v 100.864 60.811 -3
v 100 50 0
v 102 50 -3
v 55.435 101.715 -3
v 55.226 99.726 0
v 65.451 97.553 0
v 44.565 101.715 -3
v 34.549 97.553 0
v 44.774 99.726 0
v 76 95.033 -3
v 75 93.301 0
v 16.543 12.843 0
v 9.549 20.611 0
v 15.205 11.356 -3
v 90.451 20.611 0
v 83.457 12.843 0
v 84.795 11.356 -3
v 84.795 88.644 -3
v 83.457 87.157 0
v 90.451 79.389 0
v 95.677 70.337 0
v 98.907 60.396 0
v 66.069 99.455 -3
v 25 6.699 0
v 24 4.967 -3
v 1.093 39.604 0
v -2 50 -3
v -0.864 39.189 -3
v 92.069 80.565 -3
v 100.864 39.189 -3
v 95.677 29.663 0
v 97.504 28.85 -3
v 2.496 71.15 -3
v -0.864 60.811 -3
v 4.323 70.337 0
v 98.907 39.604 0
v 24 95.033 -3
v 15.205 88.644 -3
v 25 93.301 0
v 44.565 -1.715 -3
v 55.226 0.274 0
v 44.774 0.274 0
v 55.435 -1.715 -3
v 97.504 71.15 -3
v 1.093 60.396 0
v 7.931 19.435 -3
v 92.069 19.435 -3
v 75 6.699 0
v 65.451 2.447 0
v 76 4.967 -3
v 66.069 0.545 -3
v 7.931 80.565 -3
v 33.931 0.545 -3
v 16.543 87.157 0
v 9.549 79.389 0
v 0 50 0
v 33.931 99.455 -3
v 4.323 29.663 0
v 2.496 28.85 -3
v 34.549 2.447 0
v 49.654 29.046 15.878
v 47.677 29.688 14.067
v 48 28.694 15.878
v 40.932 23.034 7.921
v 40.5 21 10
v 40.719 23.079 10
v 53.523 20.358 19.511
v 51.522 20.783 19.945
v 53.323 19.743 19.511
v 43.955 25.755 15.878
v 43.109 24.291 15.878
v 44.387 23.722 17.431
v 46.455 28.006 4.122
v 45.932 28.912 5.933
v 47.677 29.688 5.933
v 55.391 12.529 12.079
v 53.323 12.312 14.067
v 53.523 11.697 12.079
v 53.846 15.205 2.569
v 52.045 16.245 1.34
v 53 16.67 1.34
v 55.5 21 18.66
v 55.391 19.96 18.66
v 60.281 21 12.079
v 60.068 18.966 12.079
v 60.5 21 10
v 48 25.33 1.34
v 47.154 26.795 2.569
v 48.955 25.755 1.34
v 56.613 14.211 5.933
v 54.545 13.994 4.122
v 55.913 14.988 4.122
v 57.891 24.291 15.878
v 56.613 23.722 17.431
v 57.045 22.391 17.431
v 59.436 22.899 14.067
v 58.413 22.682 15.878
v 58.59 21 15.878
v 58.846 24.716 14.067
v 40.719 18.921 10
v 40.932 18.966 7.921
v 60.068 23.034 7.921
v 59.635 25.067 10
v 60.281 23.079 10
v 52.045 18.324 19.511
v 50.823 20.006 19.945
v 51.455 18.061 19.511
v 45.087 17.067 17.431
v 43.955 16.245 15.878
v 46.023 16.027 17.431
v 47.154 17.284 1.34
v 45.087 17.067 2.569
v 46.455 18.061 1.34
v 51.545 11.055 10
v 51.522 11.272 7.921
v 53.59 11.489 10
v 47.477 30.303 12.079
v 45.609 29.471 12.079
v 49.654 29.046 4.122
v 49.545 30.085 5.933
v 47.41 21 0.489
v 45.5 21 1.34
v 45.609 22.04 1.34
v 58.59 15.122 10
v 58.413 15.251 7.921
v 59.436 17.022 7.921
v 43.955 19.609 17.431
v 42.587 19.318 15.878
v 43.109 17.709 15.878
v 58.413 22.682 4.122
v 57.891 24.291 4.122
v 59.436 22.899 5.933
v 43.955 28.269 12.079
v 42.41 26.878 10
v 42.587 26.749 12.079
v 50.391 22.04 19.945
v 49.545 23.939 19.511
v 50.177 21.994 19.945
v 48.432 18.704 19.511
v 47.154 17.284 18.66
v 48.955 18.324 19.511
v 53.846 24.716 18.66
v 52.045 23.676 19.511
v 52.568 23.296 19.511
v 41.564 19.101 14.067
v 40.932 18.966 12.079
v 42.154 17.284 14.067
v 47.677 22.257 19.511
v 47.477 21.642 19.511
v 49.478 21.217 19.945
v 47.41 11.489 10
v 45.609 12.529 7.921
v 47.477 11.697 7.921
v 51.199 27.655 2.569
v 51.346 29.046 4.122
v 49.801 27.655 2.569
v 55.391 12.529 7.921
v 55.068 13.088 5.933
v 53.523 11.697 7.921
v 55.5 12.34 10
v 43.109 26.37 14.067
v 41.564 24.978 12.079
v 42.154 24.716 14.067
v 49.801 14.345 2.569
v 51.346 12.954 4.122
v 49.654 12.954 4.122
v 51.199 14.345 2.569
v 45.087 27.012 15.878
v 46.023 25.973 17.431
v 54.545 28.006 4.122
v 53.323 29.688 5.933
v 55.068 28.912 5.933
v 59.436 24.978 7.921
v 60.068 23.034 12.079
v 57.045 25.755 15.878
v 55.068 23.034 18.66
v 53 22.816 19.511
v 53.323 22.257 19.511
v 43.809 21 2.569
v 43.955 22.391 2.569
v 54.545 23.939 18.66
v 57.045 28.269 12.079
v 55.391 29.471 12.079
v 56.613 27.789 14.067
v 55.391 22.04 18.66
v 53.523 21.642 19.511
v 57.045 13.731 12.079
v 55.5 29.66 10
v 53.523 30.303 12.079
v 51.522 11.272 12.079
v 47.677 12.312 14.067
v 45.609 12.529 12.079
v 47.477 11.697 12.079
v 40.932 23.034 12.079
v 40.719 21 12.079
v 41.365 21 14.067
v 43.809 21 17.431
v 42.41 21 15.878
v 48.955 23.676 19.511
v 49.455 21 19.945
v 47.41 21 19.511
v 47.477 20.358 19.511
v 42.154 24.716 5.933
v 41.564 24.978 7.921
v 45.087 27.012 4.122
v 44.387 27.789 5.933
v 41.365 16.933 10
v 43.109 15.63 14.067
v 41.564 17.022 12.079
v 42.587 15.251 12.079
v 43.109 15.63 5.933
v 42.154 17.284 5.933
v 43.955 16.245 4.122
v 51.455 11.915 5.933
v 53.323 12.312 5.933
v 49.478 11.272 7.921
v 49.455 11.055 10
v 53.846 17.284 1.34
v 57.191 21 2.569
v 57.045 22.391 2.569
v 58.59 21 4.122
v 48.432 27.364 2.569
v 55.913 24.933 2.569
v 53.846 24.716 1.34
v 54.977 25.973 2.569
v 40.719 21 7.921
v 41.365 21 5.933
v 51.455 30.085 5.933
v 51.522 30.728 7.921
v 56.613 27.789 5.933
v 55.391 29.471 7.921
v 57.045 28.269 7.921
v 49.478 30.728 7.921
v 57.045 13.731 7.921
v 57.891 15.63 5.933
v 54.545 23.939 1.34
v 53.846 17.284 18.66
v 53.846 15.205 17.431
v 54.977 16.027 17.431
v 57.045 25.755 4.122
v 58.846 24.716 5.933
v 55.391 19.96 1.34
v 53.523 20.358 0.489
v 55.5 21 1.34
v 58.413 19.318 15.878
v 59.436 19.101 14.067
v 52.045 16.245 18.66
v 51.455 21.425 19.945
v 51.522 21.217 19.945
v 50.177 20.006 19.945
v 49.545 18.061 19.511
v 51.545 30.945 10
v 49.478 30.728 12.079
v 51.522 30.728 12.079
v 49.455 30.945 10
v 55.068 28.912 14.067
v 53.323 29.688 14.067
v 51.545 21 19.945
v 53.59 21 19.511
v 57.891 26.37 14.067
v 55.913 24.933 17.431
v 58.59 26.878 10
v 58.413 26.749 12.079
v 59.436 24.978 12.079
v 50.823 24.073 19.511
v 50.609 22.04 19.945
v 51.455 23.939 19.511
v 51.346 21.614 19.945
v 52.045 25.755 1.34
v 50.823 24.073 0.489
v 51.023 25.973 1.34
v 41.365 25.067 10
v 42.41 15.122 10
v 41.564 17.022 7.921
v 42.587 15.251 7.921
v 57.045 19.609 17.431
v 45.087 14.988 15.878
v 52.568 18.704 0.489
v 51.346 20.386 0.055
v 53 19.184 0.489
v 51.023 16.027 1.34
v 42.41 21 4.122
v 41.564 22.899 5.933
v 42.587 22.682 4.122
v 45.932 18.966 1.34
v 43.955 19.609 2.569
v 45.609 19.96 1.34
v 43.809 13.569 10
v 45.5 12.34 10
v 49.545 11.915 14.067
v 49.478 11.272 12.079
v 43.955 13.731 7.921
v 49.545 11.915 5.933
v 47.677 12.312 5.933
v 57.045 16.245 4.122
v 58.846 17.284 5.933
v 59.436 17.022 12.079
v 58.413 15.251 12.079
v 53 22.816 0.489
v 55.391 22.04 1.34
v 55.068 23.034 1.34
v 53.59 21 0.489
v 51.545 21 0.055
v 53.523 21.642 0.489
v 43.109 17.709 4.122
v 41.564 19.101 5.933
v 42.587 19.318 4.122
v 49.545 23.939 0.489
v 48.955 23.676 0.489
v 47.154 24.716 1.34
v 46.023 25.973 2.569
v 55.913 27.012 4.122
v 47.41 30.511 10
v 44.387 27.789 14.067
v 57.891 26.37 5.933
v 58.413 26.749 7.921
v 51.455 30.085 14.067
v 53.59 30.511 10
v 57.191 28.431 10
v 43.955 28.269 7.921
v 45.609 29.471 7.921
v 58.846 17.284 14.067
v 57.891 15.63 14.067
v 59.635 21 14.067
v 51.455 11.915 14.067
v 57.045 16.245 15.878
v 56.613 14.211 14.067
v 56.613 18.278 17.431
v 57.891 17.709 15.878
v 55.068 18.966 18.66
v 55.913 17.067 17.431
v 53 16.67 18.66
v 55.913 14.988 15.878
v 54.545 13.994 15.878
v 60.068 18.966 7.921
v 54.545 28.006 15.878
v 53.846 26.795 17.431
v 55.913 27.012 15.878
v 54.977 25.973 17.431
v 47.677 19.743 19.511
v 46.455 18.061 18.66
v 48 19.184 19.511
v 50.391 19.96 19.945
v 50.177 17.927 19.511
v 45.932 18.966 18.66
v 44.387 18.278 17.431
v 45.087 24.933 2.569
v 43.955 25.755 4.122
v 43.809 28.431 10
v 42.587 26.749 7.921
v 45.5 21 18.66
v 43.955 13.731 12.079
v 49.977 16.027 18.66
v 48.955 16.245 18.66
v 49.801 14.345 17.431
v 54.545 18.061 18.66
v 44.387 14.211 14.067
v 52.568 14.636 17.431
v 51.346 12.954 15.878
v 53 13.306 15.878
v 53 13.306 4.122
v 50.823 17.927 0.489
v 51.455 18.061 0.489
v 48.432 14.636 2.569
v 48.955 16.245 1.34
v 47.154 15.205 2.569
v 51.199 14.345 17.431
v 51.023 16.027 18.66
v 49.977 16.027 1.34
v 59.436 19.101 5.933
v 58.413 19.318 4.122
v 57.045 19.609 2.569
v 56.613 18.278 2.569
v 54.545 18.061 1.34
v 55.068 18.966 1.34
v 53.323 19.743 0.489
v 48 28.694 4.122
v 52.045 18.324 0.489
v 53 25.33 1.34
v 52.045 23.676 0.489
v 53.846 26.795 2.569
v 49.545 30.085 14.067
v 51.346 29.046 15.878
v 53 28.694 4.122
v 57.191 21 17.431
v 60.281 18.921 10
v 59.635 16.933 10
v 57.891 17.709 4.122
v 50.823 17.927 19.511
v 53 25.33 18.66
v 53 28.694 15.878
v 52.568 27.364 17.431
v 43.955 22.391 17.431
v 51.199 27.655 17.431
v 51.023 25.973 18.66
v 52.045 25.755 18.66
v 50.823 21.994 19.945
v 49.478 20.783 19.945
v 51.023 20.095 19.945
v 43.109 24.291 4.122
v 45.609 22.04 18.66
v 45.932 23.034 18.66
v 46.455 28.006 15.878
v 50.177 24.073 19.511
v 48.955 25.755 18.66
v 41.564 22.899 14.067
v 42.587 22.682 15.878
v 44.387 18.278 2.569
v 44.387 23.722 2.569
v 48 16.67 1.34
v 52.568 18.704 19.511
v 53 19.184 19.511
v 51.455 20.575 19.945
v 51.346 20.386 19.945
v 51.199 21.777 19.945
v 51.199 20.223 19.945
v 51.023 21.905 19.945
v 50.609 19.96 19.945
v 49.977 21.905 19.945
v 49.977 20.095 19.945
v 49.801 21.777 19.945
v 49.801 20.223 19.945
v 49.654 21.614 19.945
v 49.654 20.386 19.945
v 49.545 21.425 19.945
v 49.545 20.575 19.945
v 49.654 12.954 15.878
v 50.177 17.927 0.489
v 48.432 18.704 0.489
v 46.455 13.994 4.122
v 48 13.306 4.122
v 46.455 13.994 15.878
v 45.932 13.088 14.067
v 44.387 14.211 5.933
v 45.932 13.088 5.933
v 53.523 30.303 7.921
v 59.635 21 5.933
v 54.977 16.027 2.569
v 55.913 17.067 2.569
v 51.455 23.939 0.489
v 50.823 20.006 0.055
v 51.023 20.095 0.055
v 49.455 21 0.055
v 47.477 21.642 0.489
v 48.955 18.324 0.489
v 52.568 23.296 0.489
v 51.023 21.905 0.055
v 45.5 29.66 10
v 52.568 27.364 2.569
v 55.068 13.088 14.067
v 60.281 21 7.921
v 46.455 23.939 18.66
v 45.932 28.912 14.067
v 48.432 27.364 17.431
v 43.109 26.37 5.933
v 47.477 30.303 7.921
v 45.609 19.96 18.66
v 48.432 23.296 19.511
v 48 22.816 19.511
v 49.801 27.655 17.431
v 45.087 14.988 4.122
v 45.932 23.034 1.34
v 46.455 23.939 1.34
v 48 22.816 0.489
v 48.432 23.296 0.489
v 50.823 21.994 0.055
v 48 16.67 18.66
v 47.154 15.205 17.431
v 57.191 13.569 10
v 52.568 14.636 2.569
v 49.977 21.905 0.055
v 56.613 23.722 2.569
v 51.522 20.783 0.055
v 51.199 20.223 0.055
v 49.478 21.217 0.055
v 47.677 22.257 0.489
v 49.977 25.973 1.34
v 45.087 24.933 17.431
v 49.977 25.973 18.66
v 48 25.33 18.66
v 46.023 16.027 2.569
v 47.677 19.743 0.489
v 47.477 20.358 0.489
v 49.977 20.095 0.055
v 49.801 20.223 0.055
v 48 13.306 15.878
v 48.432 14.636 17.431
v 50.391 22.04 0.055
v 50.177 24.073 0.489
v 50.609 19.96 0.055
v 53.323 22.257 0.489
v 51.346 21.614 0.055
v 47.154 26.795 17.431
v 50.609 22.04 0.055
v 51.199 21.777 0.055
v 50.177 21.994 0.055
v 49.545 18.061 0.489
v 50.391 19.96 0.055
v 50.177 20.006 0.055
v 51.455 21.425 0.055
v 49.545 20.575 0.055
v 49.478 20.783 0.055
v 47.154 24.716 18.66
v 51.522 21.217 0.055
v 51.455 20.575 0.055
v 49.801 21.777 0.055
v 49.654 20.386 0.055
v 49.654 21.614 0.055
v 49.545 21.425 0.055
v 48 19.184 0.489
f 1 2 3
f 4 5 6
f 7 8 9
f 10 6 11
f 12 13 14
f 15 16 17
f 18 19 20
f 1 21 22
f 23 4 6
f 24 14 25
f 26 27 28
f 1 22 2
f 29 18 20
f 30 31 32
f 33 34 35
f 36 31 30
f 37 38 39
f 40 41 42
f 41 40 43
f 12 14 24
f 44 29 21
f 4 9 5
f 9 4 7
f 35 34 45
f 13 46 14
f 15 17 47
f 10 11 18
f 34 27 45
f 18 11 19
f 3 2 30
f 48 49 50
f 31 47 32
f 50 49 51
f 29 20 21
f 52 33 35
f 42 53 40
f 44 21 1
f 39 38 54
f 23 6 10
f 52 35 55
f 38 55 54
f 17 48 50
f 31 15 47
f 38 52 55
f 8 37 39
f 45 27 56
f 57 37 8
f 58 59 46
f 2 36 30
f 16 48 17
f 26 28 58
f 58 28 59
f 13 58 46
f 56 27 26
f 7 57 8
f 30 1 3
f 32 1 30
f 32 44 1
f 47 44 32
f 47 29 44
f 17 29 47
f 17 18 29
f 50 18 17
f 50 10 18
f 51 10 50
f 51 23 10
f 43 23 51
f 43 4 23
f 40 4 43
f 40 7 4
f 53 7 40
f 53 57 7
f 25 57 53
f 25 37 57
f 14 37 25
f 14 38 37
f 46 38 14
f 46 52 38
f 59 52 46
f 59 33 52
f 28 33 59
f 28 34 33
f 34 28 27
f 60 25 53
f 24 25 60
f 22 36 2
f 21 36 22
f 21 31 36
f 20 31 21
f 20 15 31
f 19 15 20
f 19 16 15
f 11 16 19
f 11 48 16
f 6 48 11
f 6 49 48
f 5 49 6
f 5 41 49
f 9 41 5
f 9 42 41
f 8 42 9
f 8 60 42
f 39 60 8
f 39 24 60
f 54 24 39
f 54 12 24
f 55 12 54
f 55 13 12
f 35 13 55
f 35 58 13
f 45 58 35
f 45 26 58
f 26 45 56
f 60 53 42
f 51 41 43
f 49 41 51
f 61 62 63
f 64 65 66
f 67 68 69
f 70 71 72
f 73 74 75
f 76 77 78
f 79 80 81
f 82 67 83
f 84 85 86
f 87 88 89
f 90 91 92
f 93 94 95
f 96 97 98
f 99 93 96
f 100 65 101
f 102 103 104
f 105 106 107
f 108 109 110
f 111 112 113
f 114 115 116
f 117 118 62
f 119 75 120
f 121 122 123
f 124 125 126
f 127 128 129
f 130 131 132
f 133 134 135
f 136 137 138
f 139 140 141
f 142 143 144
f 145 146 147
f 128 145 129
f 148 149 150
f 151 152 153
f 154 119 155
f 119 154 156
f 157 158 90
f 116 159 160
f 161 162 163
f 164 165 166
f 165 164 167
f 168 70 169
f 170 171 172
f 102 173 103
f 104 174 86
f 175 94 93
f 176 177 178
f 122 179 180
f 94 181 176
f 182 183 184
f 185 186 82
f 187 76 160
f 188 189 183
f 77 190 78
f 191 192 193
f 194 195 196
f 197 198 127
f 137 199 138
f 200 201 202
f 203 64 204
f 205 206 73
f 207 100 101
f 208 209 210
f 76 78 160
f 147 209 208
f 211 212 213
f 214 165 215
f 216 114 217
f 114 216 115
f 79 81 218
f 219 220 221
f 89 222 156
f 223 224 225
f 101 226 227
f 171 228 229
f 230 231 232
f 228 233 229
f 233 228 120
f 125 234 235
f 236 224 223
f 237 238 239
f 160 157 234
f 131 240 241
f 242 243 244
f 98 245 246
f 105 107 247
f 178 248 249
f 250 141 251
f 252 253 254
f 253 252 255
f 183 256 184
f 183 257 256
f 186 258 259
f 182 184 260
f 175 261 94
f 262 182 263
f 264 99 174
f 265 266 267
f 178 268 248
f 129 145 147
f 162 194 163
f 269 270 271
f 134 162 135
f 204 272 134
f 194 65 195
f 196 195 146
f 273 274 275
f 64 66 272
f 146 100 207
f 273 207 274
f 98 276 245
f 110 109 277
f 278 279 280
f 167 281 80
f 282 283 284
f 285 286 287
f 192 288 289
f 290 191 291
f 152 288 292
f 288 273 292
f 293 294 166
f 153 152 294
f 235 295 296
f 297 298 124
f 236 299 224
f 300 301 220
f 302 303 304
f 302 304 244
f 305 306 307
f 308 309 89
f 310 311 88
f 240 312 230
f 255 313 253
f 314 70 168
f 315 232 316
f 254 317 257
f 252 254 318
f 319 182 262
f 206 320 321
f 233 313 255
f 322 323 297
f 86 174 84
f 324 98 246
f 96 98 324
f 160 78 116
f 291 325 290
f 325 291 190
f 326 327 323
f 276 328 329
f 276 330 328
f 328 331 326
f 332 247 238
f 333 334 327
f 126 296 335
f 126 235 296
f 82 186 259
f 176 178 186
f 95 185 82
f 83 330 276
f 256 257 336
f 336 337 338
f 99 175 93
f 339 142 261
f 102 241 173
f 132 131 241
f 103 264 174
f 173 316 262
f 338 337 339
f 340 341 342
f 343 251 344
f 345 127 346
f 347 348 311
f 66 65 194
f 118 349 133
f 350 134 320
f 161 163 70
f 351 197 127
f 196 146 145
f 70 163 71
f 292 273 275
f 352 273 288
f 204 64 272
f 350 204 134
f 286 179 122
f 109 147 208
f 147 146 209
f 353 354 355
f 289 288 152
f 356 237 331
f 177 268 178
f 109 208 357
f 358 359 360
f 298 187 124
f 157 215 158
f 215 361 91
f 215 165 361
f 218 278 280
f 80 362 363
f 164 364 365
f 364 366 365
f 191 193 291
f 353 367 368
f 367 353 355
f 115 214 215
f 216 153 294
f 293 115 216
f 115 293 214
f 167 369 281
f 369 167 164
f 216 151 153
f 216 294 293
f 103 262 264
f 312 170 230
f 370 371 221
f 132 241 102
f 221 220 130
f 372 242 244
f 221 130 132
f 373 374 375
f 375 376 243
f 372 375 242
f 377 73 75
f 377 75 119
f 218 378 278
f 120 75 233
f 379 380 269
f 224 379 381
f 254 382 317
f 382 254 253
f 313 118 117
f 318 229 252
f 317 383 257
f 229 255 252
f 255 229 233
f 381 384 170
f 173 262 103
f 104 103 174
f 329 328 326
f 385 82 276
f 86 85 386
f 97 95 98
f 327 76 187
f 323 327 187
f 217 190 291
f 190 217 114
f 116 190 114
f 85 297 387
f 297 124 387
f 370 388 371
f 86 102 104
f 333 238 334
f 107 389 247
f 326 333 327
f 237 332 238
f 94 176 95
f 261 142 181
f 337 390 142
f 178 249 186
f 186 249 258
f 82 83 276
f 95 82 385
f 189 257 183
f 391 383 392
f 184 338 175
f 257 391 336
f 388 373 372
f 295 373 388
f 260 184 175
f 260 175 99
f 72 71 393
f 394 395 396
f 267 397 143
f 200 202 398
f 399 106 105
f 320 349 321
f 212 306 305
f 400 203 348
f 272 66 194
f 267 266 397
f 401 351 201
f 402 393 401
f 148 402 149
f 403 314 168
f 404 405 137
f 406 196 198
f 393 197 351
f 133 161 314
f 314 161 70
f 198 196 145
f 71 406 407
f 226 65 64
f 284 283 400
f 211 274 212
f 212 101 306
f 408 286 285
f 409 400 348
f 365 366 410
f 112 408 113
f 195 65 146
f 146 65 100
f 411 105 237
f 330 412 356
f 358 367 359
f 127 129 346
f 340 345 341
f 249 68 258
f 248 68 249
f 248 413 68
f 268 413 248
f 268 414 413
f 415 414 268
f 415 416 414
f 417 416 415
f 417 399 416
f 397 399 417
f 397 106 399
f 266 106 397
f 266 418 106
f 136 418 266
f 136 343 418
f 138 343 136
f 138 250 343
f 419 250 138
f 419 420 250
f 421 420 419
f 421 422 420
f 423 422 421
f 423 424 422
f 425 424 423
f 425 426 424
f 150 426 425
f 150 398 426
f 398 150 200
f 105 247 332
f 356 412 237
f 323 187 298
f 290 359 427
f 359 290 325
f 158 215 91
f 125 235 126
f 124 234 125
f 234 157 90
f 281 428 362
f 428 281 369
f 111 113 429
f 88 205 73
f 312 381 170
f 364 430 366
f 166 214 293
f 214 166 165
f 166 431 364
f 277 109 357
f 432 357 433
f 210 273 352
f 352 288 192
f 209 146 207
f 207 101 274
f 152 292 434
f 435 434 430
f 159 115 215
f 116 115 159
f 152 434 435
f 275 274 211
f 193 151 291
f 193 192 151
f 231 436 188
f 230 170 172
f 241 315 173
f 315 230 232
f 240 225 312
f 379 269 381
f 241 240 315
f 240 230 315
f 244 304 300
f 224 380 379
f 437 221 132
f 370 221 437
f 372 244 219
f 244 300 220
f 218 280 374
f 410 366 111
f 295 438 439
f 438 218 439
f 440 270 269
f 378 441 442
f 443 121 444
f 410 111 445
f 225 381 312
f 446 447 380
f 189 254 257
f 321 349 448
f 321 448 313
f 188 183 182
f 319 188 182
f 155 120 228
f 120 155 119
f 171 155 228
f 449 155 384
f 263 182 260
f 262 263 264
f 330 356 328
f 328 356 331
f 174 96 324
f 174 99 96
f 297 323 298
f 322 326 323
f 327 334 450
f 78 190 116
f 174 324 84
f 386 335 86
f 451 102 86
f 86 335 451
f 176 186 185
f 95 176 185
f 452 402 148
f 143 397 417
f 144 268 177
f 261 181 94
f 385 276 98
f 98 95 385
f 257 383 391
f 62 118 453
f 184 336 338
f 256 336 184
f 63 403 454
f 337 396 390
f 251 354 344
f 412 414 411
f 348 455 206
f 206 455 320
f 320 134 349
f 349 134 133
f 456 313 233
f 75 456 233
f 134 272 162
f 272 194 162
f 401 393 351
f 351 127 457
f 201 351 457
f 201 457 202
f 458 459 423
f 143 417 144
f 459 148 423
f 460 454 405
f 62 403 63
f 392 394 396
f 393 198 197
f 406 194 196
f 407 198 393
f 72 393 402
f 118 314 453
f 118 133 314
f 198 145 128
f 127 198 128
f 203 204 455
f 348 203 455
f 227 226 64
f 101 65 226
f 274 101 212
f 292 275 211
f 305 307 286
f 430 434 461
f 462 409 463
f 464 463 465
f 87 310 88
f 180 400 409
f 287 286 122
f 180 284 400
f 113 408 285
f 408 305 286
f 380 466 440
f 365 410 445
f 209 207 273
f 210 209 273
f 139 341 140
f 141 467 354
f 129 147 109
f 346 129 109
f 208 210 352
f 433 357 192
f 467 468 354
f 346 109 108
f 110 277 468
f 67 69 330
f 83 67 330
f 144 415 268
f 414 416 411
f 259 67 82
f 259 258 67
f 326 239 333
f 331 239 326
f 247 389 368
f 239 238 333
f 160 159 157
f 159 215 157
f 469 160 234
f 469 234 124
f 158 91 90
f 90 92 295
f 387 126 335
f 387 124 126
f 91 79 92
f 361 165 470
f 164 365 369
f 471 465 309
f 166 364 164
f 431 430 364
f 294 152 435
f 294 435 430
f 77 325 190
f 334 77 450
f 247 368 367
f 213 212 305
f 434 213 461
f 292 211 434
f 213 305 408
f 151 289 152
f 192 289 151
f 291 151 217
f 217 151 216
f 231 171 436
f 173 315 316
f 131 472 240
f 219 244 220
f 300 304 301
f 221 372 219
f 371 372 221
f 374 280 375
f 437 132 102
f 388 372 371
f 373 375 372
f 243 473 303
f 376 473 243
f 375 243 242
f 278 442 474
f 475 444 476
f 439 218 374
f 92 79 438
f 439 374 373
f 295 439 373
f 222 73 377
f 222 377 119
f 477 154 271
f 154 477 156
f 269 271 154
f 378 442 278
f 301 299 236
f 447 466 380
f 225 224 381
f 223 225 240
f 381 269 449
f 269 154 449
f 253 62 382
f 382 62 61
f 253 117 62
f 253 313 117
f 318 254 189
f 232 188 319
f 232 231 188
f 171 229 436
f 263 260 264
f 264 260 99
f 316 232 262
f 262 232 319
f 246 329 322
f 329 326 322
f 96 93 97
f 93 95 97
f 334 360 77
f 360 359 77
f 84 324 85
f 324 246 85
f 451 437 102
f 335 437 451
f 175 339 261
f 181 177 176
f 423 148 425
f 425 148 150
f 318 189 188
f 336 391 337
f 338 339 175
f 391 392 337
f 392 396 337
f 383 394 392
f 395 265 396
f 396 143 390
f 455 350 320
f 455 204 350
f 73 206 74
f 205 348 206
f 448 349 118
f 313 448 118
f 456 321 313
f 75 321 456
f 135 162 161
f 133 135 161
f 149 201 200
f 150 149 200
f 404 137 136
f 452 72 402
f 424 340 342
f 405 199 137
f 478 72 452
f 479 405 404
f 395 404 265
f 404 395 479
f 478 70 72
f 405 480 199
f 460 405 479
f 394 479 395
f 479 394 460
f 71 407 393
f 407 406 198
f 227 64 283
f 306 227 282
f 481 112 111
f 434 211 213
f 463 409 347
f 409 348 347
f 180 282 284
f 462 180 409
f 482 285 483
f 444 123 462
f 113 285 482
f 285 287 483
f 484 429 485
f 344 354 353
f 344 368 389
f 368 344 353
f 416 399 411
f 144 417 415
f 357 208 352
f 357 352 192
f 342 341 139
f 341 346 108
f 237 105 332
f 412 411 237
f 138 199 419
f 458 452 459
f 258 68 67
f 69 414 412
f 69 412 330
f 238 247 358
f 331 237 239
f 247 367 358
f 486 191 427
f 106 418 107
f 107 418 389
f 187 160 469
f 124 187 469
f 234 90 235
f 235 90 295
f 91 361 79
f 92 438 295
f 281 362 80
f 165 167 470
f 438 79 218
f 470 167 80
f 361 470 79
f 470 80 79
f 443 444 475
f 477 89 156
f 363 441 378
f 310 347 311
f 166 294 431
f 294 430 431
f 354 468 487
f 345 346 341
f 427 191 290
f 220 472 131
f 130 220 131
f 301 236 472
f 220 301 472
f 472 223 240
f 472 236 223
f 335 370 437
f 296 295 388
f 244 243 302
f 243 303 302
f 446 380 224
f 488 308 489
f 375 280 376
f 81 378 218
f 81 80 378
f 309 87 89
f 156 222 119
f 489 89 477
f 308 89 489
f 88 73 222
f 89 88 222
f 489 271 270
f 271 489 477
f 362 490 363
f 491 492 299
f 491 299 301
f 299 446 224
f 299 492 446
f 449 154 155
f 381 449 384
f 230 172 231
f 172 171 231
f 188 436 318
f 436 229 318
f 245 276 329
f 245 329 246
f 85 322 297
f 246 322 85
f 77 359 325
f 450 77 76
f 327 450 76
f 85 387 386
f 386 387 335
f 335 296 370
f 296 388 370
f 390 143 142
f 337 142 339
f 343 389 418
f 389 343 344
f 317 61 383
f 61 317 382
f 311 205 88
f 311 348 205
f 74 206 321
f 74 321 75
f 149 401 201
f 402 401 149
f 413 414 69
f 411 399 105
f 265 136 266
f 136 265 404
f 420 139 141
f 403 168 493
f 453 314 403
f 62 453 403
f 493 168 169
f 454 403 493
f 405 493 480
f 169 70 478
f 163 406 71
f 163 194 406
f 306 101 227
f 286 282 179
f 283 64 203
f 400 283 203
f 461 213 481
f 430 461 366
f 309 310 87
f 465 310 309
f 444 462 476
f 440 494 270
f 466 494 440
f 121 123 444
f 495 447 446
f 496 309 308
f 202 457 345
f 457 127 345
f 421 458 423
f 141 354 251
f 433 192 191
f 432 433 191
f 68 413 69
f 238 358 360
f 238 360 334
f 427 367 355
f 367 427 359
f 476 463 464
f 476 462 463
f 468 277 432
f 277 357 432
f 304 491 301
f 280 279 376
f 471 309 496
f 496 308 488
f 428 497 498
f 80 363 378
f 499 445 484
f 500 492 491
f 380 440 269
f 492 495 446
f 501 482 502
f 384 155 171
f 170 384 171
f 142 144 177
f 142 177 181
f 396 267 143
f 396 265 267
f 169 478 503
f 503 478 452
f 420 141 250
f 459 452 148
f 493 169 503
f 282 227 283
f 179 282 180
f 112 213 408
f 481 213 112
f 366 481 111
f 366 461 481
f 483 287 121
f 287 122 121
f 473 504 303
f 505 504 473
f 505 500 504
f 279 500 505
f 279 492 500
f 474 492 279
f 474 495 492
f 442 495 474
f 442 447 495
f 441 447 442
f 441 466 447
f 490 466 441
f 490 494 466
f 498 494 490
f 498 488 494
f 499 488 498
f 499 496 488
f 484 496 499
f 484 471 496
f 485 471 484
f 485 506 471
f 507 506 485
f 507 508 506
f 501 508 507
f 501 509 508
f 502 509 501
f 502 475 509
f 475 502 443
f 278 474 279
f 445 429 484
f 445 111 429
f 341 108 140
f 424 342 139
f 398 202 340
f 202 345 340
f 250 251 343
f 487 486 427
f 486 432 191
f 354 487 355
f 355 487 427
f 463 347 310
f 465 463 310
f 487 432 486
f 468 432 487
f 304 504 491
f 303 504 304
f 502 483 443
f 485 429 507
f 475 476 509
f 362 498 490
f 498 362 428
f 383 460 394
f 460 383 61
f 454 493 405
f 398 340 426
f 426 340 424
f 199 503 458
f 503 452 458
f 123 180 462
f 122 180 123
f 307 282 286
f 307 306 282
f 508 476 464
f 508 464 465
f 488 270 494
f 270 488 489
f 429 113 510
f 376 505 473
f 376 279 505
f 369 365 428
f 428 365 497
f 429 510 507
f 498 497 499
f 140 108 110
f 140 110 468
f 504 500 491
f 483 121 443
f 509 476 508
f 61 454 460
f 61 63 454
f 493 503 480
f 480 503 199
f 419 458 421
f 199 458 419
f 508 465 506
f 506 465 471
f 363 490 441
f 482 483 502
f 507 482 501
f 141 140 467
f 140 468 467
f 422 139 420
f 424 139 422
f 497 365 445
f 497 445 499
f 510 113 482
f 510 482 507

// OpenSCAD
dxf_linear_extrude(file="outfile.dxf", height=8);

translate([50,50,-3])
  cylinder(r1=52,r2=50,h=3); 
  
translate([50.5,21,10])
sphere(10); 
